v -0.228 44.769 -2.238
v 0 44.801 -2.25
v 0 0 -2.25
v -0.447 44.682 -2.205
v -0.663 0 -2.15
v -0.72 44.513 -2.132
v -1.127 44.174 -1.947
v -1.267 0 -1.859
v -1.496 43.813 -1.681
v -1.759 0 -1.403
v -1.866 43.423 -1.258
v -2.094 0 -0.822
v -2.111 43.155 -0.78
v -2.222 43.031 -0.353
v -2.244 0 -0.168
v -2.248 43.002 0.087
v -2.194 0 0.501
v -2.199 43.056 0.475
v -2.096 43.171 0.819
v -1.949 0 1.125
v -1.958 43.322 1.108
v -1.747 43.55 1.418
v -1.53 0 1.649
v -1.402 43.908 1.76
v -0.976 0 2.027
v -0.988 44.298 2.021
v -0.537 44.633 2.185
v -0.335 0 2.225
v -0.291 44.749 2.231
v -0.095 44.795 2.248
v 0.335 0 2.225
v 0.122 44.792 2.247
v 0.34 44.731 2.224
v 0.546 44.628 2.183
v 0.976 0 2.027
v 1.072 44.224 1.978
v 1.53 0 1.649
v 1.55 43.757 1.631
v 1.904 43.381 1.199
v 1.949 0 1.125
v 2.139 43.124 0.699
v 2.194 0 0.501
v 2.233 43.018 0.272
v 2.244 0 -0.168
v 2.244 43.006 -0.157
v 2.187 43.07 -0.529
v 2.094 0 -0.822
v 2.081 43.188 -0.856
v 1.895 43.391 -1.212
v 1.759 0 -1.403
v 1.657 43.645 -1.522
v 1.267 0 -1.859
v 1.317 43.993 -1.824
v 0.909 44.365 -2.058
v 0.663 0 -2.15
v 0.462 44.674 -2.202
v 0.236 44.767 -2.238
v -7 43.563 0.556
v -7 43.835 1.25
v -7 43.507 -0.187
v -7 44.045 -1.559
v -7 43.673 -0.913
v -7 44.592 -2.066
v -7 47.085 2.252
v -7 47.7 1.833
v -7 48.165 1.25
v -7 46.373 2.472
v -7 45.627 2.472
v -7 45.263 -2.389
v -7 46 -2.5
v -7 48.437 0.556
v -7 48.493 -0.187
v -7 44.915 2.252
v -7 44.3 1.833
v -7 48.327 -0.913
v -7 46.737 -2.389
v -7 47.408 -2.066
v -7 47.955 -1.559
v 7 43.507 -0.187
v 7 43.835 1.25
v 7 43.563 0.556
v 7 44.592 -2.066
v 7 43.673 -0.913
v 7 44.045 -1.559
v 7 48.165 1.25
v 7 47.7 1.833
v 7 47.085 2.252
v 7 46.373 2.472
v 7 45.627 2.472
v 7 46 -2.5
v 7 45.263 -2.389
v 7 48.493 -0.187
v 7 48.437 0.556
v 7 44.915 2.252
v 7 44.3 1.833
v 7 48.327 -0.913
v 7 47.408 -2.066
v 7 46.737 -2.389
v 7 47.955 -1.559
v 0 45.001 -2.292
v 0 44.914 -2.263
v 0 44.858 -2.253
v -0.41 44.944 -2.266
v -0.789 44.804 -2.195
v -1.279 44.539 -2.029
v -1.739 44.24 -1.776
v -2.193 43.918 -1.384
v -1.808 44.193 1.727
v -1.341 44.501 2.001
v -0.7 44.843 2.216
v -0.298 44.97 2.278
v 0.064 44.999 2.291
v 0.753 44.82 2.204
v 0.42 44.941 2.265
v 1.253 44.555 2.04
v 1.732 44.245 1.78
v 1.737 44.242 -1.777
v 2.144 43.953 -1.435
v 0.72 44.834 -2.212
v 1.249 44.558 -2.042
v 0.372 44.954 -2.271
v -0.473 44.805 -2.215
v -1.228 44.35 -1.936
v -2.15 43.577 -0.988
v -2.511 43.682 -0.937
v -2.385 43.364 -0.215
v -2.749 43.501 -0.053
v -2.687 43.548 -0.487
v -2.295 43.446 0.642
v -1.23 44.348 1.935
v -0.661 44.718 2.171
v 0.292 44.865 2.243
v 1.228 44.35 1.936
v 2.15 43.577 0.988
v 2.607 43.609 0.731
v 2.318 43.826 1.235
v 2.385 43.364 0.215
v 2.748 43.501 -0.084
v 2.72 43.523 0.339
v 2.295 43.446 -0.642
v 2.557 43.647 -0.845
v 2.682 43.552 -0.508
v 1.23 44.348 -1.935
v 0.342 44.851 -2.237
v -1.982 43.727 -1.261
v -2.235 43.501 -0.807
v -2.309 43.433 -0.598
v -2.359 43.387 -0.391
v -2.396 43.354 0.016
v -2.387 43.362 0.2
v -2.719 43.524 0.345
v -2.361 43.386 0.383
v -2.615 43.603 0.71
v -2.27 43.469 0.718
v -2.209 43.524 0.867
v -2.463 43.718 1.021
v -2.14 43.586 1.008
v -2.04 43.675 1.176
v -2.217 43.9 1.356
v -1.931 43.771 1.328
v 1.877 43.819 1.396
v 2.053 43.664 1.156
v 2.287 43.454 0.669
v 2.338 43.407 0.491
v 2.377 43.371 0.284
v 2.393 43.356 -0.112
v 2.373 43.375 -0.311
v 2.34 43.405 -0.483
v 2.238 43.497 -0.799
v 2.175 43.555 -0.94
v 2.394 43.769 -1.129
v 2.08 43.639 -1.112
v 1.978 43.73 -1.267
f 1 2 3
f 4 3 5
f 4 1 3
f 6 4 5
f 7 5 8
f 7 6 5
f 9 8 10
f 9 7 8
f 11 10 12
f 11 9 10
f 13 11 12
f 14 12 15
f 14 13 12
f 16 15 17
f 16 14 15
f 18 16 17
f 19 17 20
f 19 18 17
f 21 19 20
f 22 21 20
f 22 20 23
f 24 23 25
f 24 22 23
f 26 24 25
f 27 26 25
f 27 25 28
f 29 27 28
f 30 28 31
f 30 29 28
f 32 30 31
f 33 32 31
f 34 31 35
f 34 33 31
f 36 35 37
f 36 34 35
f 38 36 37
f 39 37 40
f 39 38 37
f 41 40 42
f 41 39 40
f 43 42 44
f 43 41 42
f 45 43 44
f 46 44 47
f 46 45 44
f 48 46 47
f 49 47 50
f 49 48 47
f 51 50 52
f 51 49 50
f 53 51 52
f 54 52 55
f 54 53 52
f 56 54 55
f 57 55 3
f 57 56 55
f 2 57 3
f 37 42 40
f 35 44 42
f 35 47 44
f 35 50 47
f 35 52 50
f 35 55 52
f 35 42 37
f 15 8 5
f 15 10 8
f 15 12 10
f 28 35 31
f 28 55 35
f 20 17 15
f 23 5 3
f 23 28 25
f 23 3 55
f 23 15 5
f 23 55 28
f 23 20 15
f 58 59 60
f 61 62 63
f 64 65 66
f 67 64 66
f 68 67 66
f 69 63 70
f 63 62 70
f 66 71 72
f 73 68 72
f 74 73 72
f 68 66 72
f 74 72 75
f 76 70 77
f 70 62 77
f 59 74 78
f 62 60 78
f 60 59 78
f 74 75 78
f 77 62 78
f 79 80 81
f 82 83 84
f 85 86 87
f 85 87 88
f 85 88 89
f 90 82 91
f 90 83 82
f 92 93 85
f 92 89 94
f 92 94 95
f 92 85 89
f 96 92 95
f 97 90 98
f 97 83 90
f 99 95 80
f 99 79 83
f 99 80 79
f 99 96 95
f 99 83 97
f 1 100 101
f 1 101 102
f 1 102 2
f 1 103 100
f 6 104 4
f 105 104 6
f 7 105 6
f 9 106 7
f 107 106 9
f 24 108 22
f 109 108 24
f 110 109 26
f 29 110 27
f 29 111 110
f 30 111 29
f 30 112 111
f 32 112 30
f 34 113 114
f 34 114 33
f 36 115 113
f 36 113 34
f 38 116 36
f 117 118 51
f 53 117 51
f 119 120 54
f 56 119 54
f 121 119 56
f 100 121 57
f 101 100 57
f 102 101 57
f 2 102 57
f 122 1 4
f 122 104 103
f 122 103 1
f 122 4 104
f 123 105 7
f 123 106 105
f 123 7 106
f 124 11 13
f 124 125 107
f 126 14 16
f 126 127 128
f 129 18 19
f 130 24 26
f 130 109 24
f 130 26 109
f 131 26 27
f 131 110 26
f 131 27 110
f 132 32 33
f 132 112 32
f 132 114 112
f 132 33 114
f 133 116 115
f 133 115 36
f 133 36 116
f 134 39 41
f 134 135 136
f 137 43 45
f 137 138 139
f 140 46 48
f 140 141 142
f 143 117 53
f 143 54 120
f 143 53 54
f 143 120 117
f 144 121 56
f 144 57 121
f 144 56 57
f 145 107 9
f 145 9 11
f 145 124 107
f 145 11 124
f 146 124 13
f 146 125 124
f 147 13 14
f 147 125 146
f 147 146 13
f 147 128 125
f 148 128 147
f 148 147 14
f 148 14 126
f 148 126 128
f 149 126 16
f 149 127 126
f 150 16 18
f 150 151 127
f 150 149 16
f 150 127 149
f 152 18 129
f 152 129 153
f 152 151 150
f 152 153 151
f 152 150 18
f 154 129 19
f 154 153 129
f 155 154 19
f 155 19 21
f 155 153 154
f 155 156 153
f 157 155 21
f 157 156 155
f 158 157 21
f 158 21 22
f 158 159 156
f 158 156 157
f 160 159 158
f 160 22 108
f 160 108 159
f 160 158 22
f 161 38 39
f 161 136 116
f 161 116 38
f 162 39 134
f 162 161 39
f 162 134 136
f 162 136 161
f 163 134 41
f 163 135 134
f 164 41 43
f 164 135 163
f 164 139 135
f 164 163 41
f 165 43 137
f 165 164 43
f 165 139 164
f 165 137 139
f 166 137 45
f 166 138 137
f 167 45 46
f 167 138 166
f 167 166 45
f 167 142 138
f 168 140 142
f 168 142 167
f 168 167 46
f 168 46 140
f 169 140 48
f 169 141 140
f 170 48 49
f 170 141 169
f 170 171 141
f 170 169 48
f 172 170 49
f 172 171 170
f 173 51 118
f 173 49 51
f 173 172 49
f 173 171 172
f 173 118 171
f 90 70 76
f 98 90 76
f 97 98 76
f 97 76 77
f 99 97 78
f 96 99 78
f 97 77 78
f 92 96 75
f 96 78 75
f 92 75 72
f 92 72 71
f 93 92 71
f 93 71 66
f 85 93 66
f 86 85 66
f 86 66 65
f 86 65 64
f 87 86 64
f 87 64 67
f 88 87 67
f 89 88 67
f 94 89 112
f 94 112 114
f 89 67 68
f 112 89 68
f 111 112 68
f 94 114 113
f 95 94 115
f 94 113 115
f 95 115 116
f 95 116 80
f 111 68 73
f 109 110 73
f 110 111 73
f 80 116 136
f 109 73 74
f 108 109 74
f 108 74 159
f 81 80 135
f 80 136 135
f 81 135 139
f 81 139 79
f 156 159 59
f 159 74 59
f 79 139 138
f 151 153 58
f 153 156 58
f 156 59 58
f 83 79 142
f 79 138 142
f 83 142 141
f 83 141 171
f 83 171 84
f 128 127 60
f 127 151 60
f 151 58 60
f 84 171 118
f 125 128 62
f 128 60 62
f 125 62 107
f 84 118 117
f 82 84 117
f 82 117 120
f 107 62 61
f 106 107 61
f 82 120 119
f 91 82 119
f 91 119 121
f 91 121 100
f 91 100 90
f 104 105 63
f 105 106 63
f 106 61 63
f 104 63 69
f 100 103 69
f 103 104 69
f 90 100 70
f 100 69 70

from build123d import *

# Parameters (mm, degrees)
CROQUIS1_W                   = 2.25
CROQUIS1_H                   = 46
SALIENTE_EXTRUIR1_DEPTH      = 7
SALIENTE_EXTRUIR1_DEPTH_BACK = 7
CROQUIS2_R                   = 2.5
REDONDEO3_R                  = 0.5


with BuildPart() as part:
    # Croquis1 → Revolución1 (revolve)
    with BuildSketch(Plane.XY):
        with Locations((1.125, 23)):
            Rectangle(CROQUIS1_W, CROQUIS1_H)
    revolve(axis=Axis((0, 0, 0), (0, 1, 0)))

    # Croquis2 → Saliente-Extruir1 (add, two sides: drawn at the far end of the back side and taken through both)
    with BuildSketch(Plane(origin=(0, 0, 0), x_dir=(0, 0, -1), z_dir=(1, 0, 0)).offset(-SALIENTE_EXTRUIR1_DEPTH_BACK)):
        with Locations((0, 46)):
            Circle(CROQUIS2_R)
    extrude(amount=SALIENTE_EXTRUIR1_DEPTH + SALIENTE_EXTRUIR1_DEPTH_BACK)

    # Redondeo3
    redondeo3_edges = [part.edges().sort_by_distance(p)[0] for p in [
        (1.560544062, 44.096635151, 1.620864661),
    ]]
    fillet(redondeo3_edges, radius=REDONDEO3_R)


solid = part.part
